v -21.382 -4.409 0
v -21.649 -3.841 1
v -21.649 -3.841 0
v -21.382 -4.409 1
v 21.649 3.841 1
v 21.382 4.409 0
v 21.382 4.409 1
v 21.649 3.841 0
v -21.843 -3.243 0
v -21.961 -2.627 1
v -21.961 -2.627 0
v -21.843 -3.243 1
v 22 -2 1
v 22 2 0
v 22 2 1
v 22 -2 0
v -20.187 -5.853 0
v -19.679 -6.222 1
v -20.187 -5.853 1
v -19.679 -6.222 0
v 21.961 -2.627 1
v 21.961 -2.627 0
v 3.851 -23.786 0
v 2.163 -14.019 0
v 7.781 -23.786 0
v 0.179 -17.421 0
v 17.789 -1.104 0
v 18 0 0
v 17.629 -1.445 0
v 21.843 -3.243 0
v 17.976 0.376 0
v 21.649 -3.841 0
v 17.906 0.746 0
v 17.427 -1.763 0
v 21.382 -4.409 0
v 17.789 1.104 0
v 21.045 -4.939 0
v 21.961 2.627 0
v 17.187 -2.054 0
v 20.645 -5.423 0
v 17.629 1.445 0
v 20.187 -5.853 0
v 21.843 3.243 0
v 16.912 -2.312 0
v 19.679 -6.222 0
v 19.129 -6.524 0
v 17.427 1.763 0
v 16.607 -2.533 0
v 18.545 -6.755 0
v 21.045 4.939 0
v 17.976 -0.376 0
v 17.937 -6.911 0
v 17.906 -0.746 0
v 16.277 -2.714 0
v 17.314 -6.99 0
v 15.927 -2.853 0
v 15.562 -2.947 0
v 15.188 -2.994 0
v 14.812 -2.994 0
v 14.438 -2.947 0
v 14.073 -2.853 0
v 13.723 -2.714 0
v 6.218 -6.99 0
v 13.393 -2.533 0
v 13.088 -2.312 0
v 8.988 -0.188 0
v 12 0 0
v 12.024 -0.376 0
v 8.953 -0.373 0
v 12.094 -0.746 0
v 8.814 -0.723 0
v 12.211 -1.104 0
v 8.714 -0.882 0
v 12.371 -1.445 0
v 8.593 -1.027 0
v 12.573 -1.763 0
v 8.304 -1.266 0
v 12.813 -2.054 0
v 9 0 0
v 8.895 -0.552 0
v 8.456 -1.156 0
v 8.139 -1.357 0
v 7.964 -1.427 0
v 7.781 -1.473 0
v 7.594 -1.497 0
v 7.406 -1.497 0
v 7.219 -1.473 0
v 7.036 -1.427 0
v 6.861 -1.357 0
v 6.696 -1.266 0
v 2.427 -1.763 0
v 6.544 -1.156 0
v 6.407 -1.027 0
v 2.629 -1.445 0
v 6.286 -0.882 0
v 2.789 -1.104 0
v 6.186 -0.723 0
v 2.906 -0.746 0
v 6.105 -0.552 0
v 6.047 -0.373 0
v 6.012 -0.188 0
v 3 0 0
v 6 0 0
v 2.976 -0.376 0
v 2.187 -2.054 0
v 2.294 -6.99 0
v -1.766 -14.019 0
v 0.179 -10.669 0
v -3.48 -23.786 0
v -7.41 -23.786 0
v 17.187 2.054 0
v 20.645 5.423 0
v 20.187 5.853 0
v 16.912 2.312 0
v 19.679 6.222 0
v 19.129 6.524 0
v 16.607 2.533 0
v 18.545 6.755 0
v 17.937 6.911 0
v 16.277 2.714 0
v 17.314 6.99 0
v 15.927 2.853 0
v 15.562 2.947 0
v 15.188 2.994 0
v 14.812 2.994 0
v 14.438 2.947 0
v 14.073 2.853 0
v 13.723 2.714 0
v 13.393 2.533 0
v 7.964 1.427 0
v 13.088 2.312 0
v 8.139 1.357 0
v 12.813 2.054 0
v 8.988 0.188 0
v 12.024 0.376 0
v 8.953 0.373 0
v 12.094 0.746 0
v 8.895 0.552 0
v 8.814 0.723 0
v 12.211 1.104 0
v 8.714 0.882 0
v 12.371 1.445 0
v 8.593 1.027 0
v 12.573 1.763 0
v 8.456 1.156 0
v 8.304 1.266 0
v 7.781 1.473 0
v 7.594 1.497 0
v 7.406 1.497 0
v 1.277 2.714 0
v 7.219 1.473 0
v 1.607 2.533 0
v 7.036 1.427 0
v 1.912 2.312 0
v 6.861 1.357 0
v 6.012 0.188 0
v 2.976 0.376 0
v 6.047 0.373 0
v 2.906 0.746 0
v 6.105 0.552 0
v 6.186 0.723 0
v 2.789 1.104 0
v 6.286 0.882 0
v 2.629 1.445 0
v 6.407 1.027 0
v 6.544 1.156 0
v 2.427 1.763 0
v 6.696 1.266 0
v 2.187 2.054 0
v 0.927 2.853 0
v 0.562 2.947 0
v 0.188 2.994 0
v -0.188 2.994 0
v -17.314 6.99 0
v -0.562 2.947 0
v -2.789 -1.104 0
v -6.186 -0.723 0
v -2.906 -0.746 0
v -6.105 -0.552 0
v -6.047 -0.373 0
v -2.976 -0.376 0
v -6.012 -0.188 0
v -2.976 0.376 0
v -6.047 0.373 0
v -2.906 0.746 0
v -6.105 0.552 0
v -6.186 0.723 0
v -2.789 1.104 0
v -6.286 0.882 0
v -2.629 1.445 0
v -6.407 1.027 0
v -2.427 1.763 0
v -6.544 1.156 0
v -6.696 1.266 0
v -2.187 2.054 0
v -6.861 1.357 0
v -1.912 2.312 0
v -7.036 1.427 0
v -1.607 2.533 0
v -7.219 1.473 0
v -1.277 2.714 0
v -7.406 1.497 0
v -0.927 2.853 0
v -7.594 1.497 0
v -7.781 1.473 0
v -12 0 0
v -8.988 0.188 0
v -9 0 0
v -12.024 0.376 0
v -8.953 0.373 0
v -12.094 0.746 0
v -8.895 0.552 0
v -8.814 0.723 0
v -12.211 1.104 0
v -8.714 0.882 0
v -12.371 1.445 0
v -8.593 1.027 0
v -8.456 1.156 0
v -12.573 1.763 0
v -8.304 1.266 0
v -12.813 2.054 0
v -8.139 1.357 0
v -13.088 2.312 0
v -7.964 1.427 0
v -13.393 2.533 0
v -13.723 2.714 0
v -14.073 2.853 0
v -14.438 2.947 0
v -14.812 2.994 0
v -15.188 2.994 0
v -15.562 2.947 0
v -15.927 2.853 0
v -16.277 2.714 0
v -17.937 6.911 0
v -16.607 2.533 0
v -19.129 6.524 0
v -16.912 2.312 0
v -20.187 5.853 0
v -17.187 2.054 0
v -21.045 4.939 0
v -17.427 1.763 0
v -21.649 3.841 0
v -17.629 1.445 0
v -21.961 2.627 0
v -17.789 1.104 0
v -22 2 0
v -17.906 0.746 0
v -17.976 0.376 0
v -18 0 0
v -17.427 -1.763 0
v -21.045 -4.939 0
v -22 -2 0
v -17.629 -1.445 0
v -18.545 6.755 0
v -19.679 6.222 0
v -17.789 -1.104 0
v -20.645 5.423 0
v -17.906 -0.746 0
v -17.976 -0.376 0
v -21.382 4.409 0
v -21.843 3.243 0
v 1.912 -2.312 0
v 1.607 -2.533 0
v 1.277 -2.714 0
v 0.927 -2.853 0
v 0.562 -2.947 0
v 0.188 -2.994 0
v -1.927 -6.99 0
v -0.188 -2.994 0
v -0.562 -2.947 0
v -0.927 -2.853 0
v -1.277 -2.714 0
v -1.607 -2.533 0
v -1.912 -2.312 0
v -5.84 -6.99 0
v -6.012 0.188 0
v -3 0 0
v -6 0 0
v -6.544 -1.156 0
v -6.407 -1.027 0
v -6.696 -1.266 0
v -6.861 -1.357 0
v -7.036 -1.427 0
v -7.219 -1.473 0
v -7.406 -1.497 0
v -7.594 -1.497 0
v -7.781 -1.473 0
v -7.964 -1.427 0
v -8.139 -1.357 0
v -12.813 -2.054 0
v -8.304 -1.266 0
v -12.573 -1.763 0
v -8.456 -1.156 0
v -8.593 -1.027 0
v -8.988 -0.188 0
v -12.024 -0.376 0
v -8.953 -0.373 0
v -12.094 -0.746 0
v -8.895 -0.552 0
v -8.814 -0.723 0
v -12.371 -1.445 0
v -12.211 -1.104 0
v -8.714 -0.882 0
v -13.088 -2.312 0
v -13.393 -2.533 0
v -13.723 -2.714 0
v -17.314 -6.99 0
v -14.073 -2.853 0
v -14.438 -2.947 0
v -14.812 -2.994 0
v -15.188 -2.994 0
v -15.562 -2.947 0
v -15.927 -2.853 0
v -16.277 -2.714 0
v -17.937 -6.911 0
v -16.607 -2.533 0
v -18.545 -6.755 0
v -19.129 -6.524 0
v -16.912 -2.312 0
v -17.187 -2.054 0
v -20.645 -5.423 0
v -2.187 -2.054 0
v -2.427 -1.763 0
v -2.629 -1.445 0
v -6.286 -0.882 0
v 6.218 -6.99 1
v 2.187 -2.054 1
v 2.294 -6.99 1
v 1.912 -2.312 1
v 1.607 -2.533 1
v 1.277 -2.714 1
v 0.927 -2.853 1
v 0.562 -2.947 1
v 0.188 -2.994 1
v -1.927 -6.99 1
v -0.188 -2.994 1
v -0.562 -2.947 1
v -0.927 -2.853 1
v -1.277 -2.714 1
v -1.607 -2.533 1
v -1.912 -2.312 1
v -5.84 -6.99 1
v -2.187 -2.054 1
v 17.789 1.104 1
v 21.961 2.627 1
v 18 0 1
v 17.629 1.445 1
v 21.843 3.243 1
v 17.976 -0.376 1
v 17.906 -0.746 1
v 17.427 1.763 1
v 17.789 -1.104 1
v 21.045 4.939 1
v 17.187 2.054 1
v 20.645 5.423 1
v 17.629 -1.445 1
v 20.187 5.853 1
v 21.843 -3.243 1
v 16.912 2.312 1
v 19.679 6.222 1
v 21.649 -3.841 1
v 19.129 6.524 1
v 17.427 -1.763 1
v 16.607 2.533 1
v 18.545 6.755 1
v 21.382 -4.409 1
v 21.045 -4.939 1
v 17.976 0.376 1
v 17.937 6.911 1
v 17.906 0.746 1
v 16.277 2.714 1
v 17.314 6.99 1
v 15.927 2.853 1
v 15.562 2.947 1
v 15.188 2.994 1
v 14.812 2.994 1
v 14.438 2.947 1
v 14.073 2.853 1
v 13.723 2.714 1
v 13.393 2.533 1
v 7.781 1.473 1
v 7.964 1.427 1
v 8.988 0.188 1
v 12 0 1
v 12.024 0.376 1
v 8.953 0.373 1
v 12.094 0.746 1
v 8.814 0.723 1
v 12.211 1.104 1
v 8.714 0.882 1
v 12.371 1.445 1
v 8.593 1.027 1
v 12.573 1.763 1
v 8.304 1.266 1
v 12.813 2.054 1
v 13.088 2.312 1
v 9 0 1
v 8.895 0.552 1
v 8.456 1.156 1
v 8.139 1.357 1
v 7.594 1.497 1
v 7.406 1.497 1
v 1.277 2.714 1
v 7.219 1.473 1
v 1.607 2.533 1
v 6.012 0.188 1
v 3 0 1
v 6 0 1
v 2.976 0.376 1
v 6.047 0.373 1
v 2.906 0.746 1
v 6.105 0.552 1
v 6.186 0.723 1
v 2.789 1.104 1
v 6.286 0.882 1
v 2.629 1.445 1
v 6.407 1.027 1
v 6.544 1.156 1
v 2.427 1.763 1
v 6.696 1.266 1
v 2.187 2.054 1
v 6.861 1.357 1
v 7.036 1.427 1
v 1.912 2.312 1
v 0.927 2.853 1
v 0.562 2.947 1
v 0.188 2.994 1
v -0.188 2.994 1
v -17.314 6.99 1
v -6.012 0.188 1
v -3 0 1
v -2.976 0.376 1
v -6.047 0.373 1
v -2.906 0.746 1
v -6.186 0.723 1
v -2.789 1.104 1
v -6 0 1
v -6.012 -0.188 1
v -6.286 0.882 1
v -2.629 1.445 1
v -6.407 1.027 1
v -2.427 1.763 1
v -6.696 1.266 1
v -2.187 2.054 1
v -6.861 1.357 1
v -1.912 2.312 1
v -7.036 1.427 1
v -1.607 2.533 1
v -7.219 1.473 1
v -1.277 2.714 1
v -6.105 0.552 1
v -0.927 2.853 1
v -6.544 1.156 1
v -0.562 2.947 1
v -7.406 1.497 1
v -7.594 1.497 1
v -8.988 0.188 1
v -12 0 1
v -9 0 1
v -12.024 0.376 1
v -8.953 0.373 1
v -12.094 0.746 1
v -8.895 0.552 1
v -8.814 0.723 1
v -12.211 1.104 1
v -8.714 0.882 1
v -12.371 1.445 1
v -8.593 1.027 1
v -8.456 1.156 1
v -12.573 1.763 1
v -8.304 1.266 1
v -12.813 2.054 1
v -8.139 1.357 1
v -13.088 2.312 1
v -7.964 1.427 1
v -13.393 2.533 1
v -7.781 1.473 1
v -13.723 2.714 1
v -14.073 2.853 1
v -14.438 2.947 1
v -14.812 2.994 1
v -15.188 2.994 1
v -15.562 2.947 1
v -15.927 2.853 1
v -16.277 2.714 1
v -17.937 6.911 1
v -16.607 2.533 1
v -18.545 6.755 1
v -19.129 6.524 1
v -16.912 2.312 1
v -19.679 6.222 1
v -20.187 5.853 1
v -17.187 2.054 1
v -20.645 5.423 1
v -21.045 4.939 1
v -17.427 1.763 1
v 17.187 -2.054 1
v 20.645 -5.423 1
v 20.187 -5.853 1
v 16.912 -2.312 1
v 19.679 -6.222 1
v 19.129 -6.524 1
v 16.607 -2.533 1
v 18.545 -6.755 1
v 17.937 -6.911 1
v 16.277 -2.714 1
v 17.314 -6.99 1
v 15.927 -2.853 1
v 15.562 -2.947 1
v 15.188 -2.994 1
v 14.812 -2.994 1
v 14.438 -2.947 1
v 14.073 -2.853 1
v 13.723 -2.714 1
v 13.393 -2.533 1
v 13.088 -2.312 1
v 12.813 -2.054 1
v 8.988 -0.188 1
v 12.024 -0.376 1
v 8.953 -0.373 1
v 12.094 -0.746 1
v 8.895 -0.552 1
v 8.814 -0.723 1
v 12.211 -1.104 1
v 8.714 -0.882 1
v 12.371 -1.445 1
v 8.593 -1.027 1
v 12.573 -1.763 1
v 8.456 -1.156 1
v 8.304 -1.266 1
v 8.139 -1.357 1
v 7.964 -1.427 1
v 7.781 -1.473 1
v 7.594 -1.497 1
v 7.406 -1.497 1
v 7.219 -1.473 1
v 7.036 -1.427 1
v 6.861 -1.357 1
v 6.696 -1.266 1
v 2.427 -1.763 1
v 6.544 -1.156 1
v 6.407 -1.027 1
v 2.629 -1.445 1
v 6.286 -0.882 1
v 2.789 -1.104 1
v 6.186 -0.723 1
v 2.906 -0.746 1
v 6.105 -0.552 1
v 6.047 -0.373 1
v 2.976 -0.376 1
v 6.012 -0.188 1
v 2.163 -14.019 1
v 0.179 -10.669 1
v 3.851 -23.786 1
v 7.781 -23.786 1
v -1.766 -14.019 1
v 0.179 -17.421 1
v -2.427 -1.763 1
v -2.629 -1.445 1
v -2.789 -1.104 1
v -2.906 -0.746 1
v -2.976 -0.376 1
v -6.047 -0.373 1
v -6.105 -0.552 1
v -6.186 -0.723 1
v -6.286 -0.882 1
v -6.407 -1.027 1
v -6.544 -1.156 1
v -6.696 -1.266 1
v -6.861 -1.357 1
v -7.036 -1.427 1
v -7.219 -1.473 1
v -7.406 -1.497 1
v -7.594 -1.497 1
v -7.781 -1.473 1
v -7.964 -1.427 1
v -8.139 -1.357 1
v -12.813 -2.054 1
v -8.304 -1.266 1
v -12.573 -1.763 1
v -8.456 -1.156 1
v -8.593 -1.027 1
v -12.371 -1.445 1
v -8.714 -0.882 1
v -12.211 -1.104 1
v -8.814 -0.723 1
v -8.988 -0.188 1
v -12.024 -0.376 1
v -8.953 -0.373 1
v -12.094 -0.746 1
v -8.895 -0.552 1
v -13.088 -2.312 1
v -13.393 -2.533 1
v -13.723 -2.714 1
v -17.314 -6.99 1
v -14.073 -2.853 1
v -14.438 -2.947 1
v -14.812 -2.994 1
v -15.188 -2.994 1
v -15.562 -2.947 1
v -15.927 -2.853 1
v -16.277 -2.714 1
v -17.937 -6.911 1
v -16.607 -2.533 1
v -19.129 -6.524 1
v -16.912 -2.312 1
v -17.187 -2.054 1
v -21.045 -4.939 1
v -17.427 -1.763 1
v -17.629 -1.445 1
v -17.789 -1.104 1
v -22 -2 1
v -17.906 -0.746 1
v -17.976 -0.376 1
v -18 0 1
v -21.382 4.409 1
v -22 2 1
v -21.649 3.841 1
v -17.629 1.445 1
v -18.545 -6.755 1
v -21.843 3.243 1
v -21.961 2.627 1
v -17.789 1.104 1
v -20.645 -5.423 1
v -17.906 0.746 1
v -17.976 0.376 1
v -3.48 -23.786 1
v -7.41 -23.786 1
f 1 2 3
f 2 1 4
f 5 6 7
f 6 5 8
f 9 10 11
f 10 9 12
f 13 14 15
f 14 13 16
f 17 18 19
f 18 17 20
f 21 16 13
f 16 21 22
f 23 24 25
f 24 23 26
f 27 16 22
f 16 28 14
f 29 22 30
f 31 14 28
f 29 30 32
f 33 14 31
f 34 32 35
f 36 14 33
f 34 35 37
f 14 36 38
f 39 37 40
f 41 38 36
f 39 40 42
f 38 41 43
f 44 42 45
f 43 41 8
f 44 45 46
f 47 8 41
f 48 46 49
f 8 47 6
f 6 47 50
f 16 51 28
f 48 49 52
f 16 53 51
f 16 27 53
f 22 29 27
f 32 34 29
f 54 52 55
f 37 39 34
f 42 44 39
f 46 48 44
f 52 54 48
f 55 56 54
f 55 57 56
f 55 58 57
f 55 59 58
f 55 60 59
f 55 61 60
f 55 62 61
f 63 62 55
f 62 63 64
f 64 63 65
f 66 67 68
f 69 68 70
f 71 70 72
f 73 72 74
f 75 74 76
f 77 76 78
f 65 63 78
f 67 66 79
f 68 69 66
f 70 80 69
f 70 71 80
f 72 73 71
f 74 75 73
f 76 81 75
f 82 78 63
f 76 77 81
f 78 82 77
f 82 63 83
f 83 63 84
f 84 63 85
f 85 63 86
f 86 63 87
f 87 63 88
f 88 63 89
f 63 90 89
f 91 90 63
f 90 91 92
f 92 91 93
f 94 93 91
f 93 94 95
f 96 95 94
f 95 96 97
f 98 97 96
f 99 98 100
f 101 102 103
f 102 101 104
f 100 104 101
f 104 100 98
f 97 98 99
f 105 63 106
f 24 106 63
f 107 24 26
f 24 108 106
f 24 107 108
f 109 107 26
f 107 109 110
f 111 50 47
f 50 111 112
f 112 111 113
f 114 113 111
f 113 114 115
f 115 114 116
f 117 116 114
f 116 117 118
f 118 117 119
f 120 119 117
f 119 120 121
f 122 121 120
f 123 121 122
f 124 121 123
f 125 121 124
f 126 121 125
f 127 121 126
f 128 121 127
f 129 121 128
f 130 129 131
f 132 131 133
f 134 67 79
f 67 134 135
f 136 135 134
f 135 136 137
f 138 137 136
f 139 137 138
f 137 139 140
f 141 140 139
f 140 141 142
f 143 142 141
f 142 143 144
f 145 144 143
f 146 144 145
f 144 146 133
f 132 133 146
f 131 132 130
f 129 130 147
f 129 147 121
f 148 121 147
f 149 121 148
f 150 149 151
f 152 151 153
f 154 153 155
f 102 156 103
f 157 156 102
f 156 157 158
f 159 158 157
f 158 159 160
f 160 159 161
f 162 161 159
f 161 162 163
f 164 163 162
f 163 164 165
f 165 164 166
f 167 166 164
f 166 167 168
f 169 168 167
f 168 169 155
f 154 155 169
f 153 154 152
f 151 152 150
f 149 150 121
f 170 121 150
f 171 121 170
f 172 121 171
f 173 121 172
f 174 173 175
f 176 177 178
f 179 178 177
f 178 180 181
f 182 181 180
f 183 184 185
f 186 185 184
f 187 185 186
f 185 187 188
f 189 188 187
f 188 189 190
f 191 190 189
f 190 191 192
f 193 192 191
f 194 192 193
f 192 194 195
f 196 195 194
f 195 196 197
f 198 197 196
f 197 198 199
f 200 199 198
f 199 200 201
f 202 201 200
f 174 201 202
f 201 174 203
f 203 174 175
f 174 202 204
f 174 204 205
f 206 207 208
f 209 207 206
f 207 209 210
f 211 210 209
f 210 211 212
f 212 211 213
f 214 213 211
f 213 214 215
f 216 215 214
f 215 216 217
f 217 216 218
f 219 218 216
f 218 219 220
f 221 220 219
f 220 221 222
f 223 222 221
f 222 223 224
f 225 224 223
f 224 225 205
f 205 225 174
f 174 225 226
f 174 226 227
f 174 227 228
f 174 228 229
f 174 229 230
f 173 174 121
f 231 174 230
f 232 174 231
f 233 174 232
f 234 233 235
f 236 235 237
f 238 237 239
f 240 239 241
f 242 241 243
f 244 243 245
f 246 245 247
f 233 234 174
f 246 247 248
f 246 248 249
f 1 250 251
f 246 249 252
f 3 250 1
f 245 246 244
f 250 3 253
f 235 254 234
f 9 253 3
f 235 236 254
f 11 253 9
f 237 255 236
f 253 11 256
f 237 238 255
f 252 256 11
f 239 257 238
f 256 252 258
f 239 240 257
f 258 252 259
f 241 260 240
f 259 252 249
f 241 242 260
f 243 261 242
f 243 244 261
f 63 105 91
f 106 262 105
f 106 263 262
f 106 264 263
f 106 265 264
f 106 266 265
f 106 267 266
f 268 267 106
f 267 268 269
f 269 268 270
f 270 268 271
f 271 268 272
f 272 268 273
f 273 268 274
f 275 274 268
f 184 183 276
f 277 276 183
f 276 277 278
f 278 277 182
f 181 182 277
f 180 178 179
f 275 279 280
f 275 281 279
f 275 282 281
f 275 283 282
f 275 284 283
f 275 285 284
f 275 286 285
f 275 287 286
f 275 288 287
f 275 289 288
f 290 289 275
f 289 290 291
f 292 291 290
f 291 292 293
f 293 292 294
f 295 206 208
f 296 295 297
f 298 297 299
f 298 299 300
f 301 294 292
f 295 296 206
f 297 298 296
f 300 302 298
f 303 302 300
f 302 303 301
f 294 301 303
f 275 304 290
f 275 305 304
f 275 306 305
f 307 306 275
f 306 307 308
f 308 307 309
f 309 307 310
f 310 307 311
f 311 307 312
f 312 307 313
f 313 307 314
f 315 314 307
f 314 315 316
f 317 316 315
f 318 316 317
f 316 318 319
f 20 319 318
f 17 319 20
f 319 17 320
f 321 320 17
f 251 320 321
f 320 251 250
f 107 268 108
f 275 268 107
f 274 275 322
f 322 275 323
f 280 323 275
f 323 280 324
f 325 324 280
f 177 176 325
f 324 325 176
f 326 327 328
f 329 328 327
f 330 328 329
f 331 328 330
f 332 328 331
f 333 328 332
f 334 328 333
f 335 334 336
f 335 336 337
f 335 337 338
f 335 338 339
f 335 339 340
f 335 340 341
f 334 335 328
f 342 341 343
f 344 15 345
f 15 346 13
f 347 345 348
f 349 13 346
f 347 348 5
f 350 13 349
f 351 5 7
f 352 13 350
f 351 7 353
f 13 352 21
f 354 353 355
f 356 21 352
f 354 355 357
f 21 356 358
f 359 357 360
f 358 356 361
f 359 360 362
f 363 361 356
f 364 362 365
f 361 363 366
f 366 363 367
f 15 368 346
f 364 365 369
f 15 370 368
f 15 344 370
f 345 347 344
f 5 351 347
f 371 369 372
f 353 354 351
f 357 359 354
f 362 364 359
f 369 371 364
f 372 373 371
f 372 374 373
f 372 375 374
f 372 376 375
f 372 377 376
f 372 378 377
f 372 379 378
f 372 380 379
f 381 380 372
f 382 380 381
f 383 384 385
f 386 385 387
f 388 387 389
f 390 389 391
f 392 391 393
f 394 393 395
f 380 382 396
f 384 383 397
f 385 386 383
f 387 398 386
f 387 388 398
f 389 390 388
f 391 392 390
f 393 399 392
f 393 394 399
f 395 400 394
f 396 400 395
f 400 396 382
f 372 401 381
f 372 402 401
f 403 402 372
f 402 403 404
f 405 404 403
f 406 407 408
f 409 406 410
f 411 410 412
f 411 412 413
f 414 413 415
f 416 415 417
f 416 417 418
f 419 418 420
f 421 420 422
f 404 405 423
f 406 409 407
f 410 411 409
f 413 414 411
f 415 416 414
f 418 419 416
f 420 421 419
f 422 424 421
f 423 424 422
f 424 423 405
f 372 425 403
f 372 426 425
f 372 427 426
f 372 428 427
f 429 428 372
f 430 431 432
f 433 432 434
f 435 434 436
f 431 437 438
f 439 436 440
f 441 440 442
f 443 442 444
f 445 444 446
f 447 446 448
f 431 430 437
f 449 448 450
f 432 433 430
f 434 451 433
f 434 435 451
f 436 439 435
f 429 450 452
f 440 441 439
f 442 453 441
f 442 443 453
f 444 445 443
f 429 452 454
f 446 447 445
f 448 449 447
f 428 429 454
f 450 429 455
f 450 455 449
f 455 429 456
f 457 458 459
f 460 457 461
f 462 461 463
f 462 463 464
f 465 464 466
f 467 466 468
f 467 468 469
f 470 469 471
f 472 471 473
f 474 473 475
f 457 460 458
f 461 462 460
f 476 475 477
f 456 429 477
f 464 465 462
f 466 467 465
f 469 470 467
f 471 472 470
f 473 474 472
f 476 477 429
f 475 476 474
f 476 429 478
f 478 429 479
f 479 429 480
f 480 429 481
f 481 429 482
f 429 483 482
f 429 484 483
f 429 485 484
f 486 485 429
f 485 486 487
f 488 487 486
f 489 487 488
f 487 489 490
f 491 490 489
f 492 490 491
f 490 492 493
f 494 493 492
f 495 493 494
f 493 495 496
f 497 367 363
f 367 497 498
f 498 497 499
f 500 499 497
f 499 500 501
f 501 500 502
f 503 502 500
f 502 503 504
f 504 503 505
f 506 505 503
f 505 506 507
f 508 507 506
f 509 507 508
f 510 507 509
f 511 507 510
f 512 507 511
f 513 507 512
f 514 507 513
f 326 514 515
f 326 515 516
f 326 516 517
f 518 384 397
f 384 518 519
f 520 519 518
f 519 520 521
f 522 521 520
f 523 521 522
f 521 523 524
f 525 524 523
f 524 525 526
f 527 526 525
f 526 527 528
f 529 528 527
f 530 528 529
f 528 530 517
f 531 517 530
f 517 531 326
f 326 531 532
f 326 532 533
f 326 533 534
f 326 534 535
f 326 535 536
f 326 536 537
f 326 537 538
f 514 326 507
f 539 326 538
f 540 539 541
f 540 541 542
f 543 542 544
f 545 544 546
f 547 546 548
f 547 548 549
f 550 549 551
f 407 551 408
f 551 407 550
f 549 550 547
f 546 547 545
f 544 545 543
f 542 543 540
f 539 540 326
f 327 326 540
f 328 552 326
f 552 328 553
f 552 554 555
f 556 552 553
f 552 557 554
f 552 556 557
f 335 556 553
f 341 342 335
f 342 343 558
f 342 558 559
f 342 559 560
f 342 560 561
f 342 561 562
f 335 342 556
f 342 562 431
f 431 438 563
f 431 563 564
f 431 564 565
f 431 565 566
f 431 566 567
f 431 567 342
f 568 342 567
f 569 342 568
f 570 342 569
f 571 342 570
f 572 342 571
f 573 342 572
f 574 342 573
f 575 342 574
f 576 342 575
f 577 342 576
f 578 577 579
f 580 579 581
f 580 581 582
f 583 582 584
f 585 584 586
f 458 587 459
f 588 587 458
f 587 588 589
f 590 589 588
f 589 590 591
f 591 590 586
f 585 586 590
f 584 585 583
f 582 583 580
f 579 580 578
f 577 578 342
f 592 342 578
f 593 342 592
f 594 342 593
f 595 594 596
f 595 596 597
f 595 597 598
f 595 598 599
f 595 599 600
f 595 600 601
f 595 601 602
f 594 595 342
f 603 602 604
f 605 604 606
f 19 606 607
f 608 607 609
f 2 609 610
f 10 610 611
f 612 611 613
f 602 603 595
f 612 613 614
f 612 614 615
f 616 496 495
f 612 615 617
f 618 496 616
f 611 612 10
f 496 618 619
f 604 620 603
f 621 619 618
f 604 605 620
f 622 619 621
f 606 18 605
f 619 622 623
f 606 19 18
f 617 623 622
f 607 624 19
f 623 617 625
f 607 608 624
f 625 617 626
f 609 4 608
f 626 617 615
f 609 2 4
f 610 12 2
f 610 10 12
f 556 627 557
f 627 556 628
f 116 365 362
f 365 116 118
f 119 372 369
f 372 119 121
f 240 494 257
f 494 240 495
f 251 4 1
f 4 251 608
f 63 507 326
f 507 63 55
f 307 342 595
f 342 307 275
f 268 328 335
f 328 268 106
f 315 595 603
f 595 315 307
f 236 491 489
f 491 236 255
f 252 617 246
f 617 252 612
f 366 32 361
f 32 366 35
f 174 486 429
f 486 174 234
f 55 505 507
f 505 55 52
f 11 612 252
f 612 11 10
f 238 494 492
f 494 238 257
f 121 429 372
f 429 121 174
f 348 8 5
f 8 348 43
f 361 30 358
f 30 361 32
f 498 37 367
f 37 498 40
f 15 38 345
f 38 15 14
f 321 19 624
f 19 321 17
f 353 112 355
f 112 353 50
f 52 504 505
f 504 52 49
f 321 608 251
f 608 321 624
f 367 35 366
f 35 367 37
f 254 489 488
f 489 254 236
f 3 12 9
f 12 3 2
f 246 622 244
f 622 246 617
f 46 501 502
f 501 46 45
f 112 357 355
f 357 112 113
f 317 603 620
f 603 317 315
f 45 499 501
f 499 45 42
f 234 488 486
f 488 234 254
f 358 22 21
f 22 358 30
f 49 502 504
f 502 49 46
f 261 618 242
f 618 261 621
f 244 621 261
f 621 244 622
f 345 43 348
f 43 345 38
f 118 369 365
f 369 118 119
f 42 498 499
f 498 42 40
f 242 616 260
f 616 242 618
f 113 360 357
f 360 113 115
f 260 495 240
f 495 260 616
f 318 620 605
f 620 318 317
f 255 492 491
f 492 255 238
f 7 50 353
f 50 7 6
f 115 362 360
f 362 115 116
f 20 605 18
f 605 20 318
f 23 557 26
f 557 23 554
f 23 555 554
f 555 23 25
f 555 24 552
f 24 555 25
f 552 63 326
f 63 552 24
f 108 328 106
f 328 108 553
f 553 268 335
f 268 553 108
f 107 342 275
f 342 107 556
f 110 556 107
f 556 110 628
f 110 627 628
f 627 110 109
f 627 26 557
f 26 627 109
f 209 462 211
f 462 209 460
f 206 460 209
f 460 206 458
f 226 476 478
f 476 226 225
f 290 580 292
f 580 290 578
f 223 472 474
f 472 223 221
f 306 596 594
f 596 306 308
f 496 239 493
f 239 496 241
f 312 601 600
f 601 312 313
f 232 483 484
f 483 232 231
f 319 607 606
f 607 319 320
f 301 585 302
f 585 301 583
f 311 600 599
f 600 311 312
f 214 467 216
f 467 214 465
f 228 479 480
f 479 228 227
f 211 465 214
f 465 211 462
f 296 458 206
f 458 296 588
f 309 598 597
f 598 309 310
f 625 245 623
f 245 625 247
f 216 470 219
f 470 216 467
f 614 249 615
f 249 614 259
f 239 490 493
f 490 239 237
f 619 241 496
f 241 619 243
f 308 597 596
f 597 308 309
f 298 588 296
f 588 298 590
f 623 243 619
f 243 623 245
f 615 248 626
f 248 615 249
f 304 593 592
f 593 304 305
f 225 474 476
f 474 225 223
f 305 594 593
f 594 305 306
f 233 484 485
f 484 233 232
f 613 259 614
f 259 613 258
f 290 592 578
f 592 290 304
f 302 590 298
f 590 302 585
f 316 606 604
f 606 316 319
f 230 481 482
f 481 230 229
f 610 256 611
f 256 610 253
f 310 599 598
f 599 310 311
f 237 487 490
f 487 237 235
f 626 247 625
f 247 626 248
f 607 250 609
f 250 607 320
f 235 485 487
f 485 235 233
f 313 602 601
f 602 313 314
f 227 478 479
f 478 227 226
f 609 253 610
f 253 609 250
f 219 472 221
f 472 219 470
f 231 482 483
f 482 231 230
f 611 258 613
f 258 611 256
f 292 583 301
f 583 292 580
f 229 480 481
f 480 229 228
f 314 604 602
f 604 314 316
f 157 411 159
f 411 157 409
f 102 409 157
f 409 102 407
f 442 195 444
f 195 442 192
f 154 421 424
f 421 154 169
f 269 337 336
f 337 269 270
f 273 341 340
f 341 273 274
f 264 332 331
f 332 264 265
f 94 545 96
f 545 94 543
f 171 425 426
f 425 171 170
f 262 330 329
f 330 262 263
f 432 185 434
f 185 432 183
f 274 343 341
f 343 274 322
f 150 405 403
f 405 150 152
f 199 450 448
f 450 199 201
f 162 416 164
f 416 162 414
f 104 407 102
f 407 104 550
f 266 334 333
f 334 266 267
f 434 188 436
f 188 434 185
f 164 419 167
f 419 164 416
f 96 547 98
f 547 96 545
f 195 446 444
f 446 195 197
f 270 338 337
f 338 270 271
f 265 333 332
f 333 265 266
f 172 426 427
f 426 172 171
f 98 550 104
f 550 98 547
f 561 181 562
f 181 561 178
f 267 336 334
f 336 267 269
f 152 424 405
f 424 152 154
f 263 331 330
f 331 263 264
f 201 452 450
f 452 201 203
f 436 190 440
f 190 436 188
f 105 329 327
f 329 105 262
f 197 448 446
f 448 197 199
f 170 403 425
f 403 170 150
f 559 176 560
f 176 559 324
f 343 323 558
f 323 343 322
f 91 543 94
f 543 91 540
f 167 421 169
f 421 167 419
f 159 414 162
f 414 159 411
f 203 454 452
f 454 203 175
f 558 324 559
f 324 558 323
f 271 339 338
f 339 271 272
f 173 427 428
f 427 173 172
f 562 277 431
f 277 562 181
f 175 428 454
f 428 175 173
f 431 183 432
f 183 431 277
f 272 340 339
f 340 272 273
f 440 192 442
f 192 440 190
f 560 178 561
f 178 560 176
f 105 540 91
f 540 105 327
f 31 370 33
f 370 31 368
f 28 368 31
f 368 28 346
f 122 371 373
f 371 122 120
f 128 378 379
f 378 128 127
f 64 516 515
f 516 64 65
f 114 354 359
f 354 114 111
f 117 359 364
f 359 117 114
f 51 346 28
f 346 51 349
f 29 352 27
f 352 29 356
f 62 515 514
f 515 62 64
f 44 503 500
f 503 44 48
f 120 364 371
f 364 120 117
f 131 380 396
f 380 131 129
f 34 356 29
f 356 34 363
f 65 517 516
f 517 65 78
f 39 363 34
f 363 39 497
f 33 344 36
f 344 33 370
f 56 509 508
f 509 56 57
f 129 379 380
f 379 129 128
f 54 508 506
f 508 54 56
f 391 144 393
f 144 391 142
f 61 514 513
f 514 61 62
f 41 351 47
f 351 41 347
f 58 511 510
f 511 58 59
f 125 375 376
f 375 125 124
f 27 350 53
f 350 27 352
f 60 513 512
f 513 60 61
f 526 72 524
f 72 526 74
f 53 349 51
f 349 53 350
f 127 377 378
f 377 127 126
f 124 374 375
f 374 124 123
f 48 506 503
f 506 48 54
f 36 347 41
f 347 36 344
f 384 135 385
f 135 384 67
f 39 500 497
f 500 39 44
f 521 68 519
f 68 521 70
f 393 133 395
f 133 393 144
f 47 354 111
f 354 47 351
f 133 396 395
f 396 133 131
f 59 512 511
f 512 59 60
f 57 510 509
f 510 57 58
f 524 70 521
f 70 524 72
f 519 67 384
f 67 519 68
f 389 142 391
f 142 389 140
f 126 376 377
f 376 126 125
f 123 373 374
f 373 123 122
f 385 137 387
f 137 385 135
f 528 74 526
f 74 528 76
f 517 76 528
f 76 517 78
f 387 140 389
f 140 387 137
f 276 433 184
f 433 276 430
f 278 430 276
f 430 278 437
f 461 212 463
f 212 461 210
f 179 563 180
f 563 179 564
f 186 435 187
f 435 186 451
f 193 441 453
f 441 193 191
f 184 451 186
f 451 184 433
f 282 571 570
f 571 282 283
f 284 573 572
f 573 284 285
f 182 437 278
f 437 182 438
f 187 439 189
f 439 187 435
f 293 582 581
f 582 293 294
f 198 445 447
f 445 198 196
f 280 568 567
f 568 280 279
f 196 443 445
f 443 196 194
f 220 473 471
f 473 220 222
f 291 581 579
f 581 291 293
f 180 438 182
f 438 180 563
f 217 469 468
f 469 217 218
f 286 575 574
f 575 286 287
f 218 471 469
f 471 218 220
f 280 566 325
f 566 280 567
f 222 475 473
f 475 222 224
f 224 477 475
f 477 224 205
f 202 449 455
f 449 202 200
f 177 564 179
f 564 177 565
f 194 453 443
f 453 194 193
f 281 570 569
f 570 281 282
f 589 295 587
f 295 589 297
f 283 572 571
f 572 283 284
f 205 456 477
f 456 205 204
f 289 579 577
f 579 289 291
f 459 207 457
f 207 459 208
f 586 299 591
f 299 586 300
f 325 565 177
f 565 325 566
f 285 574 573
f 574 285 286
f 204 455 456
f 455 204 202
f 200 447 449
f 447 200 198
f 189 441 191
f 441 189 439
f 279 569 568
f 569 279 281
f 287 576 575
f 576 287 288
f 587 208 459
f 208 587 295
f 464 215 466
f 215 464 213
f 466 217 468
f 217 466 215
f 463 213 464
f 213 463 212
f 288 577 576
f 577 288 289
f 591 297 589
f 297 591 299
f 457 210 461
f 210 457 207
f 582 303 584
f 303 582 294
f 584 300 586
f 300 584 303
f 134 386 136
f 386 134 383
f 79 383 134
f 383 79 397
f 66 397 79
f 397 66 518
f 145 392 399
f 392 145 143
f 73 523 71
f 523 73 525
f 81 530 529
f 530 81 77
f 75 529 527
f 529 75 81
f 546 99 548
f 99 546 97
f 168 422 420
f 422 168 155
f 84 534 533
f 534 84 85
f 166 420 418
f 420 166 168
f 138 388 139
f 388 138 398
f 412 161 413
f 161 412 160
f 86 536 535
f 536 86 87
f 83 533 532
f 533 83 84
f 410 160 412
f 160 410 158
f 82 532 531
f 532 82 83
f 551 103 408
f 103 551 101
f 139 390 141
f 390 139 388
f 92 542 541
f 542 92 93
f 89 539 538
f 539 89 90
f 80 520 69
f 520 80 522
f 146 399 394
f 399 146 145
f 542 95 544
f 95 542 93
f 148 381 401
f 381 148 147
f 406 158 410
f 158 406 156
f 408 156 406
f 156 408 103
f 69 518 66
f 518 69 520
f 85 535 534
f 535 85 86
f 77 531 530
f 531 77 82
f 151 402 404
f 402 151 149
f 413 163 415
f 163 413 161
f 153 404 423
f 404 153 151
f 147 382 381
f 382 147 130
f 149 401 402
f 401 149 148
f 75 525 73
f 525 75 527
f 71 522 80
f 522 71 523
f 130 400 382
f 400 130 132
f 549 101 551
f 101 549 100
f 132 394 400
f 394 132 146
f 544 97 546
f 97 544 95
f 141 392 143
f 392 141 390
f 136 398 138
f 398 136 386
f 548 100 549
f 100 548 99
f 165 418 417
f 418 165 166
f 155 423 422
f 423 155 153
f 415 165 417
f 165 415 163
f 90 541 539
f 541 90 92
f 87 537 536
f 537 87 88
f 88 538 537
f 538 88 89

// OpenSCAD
$fn = 50;


difference() {
	union() {
		*color(alpha = 1.0000000000, c = "gray") {
			translate(v = [0, 14, 0]) {
				linear_extrude(height = 1) {
					text(font = "Arial:style=Bold", halign = "center", size = 4.5000000000, text = "COMMENT description oobb_plate_shape_p_type_1_depth_3_width_1_thickness_x_extra_oobb_size", valign = "center");
				}
			}
		}
		hull() {
			translate(v = [-17.0000000000, 2.0000000000, 0]) {
				cylinder(h = 1, r = 5);
			}
			translate(v = [17.0000000000, 2.0000000000, 0]) {
				cylinder(h = 1, r = 5);
			}
			translate(v = [-17.0000000000, -2.0000000000, 0]) {
				cylinder(h = 1, r = 5);
			}
			translate(v = [17.0000000000, -2.0000000000, 0]) {
				cylinder(h = 1, r = 5);
			}
		}
		translate(v = [0, -5, 0]) {
			linear_extrude(height = 1) {
				text(font = "DejaVu Sans Mono:style=Bold", halign = "center", size = 19.0000000000, text = "X", valign = "top");
			}
		}
	}
	union() {
		*color(alpha = 1.0000000000, c = "gray") {
			translate(v = [0, 14, 0]) {
				linear_extrude(height = 1) {
					text(font = "Arial:style=Bold", halign = "center", size = 4.5000000000, text = "COMMENT description oobb_holes_shape_n_type_3_width_1_thickness_x_extra_oobb_size_1_height_'all'_holes_true_both_holes", valign = "center");
				}
			}
		}
		translate(v = [-15.0000000000, 0.0000000000, 0]) {
			translate(v = [0, 0, -50]) {
				cylinder(h = 100, r = 3.0000000000);
			}
		}
		translate(v = [0, 0, -50]) {
			cylinder(h = 100, r = 3.0000000000);
		}
		translate(v = [15.0000000000, 0.0000000000, 0]) {
			translate(v = [0, 0, -50]) {
				cylinder(h = 100, r = 3.0000000000);
			}
		}
		translate(v = [-15.0000000000, 0.0000000000, 0]) {
			translate(v = [0, 0, -50]) {
				cylinder(h = 100, r = 1.5000000000);
			}
		}
		translate(v = [-7.5000000000, 0.0000000000, 0]) {
			translate(v = [0, 0, -50]) {
				cylinder(h = 100, r = 1.5000000000);
			}
		}
		translate(v = [0, 0, -50]) {
			cylinder(h = 100, r = 1.5000000000);
		}
		translate(v = [7.5000000000, 0.0000000000, 0]) {
			translate(v = [0, 0, -50]) {
				cylinder(h = 100, r = 1.5000000000);
			}
		}
		translate(v = [15.0000000000, 0.0000000000, 0]) {
			translate(v = [0, 0, -50]) {
				cylinder(h = 100, r = 1.5000000000);
			}
		}
	}
}
